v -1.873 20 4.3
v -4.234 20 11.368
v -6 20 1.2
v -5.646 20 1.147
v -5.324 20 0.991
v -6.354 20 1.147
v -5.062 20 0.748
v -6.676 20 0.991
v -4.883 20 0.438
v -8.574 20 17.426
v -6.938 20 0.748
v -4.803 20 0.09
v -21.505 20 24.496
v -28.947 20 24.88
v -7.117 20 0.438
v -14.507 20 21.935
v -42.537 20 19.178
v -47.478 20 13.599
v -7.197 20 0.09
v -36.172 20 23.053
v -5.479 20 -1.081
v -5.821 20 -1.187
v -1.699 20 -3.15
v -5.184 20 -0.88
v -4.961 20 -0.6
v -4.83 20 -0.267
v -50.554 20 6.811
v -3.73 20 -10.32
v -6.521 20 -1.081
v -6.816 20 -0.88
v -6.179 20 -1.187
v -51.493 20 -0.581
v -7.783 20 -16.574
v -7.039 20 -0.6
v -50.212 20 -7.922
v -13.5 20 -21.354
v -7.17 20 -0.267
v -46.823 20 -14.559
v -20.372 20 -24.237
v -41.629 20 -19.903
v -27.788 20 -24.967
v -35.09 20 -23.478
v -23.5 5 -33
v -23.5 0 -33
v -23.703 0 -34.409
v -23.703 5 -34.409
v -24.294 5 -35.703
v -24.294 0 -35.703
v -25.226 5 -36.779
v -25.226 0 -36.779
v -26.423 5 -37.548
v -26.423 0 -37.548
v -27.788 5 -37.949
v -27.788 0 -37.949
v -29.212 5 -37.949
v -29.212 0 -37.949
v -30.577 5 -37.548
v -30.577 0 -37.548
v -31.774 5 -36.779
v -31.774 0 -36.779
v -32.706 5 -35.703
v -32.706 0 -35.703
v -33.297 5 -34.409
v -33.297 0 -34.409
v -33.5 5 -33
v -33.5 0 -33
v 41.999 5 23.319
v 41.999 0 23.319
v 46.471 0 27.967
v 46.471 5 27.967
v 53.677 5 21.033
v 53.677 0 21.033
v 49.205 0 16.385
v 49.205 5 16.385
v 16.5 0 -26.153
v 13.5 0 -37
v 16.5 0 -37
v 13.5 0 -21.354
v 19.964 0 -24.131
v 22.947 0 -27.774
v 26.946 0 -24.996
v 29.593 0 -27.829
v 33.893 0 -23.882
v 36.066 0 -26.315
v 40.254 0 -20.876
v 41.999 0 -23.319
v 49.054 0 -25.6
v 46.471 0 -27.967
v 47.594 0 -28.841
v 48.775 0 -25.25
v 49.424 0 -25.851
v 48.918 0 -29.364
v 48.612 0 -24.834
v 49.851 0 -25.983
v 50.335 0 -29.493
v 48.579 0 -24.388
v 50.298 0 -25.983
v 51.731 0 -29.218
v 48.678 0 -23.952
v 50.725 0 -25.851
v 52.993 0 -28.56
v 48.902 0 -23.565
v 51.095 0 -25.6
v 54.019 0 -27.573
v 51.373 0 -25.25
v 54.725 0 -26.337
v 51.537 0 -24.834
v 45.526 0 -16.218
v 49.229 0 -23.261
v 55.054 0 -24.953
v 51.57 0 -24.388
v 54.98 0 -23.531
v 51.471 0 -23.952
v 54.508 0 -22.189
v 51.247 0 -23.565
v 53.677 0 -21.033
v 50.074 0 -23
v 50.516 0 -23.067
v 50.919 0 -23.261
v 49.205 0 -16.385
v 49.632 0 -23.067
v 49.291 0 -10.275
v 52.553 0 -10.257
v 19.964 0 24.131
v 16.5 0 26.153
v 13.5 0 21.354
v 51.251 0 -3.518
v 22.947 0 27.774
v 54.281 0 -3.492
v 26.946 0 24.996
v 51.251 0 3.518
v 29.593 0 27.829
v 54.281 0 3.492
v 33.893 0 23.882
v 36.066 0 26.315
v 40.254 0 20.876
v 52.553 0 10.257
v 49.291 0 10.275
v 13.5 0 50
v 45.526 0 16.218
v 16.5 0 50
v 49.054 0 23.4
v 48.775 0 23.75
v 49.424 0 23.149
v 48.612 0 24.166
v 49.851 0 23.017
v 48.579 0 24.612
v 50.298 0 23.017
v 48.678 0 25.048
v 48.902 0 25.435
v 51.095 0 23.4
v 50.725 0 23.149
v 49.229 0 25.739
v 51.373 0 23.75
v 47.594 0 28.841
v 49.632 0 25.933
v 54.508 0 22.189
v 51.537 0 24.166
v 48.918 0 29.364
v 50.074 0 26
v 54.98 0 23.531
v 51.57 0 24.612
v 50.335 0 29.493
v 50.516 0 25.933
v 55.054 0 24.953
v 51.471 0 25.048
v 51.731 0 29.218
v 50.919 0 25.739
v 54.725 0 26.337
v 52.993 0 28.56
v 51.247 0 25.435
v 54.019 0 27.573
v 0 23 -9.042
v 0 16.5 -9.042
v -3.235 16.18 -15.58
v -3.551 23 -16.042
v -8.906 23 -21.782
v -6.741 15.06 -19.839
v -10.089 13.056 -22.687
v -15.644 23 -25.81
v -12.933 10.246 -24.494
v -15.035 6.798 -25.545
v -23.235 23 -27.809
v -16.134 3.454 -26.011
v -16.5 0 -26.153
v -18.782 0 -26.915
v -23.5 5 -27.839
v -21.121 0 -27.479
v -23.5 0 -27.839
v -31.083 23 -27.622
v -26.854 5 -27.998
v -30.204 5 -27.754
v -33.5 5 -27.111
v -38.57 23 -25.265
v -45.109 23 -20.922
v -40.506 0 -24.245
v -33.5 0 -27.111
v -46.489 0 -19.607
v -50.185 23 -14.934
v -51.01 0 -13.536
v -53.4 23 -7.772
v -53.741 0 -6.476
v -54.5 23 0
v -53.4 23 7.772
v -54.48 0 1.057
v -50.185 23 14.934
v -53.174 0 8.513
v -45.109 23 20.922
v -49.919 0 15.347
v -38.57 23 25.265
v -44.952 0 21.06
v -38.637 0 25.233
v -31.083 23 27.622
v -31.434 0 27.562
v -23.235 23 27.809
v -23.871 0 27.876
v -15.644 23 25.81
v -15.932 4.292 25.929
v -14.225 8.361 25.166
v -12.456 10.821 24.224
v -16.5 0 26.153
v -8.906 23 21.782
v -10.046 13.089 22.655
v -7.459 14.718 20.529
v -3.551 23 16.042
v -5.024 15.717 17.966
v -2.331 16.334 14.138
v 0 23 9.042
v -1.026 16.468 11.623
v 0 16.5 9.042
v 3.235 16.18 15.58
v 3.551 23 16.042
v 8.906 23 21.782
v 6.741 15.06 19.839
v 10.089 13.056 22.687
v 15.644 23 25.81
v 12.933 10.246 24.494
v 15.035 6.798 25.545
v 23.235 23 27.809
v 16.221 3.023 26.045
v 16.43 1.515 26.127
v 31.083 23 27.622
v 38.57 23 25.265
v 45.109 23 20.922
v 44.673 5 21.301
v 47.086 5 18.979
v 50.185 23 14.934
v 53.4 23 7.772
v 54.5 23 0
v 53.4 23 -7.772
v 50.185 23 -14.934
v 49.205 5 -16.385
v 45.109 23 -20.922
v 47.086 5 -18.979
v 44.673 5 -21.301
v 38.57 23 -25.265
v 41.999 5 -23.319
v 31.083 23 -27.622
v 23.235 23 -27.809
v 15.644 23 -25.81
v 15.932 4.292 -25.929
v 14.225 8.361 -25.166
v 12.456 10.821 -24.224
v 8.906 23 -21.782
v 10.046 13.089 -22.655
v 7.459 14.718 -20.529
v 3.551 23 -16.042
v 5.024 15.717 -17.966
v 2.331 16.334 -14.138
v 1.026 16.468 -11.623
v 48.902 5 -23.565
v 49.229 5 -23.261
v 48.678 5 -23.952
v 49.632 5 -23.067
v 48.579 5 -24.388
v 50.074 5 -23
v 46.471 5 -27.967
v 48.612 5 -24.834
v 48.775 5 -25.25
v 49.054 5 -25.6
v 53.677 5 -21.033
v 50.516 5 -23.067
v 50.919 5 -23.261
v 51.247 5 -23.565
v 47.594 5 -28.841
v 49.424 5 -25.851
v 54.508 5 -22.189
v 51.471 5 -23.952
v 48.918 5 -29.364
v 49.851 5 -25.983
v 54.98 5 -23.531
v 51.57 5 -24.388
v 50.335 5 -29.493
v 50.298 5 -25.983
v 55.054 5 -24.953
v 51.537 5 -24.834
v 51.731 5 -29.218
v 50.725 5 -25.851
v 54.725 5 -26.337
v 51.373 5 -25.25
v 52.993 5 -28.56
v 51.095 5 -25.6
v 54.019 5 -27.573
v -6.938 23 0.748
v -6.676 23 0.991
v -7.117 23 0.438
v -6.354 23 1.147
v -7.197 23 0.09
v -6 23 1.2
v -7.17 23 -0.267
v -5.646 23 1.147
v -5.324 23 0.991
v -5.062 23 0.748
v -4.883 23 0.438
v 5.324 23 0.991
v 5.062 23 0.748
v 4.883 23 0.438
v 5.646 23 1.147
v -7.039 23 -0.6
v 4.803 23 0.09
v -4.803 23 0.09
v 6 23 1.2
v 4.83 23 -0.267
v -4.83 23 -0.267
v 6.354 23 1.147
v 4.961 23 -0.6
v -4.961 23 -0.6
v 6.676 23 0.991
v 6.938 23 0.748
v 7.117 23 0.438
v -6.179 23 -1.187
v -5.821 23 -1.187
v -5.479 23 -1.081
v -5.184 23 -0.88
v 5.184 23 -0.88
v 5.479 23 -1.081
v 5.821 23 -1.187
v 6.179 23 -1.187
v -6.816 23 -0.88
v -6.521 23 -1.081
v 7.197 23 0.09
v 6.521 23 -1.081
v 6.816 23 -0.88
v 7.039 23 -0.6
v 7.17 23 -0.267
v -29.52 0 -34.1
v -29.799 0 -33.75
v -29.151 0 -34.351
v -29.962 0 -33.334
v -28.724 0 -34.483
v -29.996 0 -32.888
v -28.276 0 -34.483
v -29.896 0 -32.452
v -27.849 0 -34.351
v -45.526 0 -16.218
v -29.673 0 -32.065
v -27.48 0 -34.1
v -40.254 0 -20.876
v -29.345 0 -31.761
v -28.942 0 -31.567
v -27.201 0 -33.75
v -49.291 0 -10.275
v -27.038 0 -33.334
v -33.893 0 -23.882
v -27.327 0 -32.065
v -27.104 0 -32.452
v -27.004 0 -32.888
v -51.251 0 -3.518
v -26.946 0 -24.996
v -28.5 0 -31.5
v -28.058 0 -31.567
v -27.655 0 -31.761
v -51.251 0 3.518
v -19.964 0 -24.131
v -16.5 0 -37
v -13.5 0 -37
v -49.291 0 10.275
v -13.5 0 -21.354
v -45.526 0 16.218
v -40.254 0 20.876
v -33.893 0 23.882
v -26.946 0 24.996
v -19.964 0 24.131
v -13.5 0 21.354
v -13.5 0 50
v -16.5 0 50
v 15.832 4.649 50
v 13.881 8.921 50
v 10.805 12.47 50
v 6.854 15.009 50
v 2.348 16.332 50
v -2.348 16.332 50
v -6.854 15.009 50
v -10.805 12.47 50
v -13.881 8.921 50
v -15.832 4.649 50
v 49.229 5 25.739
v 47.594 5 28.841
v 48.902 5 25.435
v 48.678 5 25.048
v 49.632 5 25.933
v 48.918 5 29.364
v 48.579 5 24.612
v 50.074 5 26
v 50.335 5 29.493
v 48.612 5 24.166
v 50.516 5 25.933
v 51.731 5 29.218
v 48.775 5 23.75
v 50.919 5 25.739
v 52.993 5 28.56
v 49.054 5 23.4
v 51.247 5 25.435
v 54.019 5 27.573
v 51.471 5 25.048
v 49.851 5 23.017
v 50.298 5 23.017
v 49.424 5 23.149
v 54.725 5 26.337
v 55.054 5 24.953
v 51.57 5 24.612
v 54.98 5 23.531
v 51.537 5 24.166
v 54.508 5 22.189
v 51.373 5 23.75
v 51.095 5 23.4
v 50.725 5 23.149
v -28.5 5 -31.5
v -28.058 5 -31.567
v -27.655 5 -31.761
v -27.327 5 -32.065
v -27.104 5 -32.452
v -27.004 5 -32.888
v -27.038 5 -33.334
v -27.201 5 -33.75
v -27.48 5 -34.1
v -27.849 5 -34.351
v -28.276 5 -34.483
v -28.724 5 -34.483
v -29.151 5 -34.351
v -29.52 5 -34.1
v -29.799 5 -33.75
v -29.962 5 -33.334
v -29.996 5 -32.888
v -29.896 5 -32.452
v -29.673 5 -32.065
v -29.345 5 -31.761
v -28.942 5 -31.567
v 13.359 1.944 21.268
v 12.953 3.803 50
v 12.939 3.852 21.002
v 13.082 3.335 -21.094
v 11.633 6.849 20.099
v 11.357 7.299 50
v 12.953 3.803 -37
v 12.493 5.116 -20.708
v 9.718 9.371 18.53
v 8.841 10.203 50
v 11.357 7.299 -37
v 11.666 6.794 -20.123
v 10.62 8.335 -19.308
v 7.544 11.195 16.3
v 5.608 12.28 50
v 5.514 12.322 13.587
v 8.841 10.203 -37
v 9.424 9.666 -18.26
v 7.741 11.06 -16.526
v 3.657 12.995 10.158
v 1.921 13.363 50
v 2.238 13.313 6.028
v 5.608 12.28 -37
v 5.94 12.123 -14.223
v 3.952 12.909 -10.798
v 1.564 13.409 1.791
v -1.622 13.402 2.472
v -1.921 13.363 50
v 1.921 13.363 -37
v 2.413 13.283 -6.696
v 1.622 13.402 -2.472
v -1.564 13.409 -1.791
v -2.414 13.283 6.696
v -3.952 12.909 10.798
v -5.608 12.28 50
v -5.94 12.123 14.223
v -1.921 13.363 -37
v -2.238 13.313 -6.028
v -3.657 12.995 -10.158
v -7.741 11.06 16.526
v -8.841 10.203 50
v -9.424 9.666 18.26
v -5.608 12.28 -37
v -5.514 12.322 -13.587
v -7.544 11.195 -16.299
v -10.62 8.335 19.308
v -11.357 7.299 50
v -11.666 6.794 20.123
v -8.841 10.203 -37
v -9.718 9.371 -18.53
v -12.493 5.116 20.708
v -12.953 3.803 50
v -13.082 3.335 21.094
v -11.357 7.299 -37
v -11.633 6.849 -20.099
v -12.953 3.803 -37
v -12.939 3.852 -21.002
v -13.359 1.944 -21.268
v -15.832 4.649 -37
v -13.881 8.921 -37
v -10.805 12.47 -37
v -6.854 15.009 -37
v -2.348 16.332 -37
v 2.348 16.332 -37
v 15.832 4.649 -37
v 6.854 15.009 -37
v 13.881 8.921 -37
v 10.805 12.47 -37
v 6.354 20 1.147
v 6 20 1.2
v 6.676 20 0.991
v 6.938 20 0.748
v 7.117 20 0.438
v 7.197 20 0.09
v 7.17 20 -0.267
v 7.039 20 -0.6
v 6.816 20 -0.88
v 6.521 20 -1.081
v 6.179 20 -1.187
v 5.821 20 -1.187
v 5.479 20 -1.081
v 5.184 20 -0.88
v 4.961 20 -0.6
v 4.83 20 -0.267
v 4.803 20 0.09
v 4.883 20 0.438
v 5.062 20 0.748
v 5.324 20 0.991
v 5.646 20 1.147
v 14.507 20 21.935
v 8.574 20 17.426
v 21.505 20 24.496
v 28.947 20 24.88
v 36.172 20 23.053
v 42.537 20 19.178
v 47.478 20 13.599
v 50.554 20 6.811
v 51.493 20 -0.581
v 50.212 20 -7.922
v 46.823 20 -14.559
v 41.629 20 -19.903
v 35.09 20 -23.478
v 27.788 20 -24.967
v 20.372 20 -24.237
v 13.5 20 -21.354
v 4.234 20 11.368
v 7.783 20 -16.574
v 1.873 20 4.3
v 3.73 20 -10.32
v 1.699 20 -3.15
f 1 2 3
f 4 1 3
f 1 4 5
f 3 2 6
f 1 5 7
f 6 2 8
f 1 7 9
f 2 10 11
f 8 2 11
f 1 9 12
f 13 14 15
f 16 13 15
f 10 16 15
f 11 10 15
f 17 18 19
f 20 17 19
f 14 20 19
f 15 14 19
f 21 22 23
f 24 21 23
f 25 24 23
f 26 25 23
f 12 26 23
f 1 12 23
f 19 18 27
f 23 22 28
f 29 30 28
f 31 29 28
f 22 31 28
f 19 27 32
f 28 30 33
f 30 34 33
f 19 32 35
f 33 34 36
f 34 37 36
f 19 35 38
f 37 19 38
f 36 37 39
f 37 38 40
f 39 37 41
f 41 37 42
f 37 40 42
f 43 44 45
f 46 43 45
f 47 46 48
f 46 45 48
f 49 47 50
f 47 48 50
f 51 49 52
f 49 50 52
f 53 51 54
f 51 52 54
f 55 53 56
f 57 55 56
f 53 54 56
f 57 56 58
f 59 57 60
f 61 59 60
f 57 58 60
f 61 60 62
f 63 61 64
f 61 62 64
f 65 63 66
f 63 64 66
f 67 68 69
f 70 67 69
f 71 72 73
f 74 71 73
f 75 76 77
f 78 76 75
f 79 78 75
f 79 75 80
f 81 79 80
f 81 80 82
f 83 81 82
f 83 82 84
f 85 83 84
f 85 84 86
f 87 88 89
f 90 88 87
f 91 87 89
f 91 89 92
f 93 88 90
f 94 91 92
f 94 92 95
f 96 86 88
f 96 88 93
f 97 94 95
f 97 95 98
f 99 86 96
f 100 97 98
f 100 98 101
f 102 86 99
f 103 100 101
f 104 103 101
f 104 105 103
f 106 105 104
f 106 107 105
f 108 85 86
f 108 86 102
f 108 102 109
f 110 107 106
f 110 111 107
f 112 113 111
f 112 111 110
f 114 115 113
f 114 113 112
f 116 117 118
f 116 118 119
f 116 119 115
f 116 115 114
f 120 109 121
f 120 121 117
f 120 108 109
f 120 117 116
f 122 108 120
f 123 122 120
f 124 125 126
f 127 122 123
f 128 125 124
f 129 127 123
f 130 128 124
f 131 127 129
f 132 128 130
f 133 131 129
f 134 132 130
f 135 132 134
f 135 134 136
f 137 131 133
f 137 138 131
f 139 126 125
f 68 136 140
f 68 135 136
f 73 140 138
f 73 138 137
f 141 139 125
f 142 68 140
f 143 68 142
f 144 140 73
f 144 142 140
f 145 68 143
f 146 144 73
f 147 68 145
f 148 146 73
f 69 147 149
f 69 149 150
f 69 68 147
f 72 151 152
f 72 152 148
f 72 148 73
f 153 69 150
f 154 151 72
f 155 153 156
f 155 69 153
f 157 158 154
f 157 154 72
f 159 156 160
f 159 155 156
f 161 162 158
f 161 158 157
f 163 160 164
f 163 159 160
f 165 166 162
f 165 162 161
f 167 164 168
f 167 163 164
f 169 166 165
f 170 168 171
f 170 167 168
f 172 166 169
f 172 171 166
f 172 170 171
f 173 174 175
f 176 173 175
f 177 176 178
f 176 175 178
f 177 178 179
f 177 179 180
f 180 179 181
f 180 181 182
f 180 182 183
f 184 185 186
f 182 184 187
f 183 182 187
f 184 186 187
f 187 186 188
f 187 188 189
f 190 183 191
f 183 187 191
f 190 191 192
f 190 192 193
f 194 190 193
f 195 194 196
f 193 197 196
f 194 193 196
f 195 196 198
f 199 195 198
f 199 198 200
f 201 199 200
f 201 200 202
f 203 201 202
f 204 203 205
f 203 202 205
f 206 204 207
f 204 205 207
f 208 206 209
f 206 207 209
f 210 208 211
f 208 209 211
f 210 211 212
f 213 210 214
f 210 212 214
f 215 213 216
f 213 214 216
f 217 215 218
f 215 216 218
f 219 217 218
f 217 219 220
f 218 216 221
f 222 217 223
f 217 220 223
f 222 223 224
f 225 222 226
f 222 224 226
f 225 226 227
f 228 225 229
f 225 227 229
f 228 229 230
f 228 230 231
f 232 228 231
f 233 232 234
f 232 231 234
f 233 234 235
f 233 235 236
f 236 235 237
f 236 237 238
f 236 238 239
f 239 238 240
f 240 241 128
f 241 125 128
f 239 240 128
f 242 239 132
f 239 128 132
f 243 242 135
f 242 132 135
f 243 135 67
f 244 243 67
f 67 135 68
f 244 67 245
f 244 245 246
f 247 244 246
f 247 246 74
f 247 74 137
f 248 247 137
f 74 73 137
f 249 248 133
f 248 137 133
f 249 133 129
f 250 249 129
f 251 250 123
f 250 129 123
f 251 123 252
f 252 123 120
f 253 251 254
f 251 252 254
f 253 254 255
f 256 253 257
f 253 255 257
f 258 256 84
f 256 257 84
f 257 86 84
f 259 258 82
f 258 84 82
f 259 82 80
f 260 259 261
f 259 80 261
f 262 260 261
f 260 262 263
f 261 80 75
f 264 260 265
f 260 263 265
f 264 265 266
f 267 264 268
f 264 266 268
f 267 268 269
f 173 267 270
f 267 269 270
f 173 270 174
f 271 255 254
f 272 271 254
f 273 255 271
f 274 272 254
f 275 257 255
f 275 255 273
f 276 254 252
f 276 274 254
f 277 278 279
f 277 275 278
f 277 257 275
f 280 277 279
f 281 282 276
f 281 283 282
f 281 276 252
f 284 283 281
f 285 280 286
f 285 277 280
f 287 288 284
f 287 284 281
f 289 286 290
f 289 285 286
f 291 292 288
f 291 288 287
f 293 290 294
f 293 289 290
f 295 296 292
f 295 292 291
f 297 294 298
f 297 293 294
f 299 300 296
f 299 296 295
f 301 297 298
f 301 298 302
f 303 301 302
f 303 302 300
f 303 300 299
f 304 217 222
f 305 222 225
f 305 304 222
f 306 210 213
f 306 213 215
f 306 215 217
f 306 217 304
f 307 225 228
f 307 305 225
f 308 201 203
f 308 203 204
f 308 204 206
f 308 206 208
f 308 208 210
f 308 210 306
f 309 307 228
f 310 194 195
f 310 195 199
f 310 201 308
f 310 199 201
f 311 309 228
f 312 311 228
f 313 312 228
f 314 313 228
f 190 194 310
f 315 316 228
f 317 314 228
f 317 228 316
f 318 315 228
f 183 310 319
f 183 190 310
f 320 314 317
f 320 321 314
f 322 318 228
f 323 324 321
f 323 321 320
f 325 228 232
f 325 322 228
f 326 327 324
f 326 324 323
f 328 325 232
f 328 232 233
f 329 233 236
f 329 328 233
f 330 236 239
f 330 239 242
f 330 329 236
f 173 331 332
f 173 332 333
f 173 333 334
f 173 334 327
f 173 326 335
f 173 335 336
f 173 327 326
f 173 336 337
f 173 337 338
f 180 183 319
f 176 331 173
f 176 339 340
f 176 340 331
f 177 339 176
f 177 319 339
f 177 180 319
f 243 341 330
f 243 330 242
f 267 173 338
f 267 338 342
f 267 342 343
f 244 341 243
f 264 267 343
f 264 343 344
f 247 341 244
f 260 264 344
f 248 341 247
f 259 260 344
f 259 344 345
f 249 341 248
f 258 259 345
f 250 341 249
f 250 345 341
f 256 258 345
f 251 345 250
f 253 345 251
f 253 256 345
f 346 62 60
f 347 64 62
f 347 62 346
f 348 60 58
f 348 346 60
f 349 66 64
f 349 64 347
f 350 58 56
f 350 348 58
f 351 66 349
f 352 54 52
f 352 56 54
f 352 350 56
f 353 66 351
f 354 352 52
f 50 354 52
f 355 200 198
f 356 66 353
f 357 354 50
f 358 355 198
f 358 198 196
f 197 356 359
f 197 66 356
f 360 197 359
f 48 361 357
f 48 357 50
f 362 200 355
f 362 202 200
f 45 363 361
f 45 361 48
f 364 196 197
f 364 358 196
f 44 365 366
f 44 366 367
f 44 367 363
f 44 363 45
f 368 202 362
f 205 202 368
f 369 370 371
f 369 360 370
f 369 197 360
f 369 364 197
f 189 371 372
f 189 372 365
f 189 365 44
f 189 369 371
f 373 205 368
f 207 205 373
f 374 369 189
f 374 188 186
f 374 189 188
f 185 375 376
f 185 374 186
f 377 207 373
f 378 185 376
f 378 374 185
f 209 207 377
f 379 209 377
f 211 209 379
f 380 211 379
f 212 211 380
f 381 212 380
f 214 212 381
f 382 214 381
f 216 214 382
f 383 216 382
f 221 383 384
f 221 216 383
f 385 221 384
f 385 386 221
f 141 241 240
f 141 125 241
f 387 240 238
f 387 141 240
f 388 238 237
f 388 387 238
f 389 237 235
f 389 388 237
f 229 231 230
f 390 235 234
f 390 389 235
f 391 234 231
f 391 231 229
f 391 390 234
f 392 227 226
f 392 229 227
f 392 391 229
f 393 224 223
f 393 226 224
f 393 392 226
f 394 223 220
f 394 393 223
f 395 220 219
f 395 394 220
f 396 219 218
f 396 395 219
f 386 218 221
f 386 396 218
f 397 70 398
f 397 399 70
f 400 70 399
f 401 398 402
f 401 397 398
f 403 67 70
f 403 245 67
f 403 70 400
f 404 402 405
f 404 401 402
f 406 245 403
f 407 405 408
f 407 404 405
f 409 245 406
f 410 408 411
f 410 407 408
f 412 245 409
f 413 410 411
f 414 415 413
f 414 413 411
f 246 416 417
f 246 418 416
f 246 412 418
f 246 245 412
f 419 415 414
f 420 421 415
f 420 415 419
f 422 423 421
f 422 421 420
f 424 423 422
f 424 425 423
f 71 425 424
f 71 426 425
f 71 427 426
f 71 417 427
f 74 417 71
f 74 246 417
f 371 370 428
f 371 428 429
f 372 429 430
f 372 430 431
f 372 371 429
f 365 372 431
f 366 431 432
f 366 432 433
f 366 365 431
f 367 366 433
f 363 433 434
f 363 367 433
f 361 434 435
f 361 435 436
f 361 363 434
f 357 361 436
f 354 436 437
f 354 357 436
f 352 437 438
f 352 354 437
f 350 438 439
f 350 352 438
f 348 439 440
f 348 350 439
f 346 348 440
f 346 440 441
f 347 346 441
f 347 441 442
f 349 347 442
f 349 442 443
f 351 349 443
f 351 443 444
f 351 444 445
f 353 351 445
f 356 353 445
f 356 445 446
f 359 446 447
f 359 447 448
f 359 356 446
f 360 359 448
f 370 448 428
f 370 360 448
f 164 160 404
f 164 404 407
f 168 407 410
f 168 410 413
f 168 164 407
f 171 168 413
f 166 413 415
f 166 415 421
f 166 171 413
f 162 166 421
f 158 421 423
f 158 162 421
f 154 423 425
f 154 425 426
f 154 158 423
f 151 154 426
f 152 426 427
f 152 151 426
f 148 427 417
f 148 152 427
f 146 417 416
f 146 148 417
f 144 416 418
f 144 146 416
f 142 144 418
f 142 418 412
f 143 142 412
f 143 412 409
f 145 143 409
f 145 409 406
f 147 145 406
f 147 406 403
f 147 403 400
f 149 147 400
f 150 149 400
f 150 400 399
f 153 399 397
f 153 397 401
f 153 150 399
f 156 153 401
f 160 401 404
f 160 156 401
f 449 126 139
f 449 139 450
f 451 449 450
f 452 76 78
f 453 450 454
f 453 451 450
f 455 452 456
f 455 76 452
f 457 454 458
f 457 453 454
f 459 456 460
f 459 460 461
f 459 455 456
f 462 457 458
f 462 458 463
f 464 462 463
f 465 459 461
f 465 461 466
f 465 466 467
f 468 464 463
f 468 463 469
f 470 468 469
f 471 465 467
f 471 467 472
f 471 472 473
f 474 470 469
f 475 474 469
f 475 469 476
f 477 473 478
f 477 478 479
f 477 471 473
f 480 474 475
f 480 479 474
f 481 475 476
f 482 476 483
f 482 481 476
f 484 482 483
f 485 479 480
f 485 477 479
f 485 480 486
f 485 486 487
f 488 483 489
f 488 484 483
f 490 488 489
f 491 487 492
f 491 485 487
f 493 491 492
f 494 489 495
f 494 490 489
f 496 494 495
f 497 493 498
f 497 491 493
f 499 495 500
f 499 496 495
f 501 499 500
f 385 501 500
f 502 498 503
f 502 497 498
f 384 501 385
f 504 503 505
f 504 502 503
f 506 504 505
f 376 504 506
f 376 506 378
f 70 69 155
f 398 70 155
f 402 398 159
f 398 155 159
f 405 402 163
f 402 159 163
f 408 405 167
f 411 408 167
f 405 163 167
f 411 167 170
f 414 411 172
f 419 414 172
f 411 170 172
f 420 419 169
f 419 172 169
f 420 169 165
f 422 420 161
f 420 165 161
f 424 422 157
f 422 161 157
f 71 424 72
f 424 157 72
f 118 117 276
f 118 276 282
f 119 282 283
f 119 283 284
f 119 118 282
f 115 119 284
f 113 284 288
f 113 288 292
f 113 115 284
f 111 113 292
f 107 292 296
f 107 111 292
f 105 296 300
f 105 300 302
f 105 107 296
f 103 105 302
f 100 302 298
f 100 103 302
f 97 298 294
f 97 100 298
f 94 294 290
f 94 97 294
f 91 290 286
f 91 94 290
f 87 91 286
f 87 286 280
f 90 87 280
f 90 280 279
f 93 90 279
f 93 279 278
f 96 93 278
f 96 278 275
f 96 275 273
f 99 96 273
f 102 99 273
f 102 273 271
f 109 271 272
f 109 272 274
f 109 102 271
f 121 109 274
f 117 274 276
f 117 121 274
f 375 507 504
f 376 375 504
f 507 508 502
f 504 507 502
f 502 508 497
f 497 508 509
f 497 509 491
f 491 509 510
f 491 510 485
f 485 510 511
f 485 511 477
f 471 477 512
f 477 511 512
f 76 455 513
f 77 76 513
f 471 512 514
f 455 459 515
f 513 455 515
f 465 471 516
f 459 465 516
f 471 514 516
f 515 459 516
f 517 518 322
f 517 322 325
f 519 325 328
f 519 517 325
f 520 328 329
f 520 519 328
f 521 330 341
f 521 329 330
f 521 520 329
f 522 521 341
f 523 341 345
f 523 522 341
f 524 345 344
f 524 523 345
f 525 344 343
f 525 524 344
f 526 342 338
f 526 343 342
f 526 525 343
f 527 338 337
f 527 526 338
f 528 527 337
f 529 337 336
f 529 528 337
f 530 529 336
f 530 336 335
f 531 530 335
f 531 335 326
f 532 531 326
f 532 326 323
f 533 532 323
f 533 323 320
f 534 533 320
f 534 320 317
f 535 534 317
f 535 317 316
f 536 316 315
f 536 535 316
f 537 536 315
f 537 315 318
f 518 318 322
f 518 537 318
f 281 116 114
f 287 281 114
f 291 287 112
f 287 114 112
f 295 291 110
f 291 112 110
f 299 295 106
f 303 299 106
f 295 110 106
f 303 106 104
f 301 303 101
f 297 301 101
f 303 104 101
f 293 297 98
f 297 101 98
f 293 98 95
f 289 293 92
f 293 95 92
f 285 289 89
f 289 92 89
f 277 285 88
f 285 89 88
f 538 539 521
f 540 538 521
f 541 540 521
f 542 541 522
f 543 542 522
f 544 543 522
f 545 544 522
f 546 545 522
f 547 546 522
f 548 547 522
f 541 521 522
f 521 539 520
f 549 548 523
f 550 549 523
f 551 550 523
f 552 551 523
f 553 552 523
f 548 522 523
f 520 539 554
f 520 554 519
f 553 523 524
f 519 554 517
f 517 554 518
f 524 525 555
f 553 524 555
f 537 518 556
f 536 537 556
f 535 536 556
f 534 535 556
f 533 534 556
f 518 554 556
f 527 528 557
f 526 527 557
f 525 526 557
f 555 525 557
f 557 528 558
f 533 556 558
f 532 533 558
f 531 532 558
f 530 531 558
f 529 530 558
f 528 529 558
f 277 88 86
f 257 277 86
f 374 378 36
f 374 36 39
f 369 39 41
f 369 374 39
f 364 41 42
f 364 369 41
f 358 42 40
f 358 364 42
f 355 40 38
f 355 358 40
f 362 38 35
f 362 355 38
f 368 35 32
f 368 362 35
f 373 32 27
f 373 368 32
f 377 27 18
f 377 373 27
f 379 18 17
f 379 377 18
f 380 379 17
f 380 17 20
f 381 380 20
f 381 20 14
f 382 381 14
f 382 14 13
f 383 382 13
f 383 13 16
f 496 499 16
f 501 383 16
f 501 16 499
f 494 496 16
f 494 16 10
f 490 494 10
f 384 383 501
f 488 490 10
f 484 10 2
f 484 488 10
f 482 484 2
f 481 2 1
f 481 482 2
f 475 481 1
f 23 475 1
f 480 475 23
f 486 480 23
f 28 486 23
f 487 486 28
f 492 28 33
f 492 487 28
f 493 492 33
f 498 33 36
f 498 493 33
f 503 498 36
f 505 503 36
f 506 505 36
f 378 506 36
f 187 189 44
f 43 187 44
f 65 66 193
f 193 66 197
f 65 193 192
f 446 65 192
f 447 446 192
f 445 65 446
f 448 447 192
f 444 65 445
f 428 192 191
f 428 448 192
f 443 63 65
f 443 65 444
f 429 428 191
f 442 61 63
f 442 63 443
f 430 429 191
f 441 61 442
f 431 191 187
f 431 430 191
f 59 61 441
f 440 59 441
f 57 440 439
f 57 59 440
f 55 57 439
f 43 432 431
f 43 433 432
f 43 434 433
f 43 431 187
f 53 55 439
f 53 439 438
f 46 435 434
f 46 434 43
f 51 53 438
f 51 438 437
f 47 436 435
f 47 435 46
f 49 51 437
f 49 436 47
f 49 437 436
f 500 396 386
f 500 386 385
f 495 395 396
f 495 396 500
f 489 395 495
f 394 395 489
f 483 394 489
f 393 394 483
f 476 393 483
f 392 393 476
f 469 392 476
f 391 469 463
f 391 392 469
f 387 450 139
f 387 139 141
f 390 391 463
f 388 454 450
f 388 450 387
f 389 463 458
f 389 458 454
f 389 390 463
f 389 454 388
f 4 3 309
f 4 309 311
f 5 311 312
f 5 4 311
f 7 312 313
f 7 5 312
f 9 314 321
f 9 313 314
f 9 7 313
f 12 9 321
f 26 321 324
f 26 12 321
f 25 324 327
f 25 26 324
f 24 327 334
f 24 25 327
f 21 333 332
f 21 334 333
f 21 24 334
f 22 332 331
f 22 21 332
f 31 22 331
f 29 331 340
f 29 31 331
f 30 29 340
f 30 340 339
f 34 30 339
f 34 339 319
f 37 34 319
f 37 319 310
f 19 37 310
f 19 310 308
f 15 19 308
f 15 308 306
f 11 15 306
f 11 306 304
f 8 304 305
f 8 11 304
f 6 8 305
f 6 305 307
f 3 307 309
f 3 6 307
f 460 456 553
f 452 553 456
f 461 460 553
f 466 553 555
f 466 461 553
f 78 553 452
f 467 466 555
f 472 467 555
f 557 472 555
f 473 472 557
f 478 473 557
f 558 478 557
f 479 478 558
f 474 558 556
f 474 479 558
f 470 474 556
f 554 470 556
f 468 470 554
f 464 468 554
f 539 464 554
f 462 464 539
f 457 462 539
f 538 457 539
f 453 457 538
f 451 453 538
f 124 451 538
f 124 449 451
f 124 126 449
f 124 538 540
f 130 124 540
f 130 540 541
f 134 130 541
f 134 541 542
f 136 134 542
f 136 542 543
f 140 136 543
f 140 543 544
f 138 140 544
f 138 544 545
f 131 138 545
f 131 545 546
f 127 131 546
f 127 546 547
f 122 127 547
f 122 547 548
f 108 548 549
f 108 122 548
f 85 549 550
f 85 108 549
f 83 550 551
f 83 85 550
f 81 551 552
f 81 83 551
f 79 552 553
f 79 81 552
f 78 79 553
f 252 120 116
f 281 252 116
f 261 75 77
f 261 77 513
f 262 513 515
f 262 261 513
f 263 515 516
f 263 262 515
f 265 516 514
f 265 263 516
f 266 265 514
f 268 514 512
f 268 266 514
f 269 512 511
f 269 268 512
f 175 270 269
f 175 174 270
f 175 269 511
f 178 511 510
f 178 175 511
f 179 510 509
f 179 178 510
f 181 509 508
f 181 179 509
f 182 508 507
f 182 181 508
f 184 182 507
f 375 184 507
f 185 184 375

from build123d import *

# Parameters (mm, degrees)
BOSS_EXTRUDE1_DEPTH     = 23
SKETCH2_R               = 1.5
BOSS_EXTRUDE2_DEPTH     = 5
SKETCH3_R               = 1.5
BOSS_EXTRUDE3_DEPTH     = 5
BOSS_EXTRUDE4_DEPTH     = 37
BOSS_EXTRUDE5_START     = 50
BOSS_EXTRUDE5_DEPTH     = 50
CUT_EXTRUDE1_DEPTH      = 78.86002886
CUT_EXTRUDE1_DEPTH_BACK = 78.86002886
SKETCH5_R               = 25
CUT_EXTRUDE4_DEPTH      = 20
SKETCH7_R               = 1.2
CUT_EXTRUDE6_DEPTH      = 78.86002886


with BuildPart() as part:
    # Sketch1 → Boss-Extrude1 (new body)
    with BuildSketch(Plane(origin=(0, 0, 0), x_dir=(1, 0, 0), z_dir=(0, 1, 0))):
        with BuildLine():
            ThreePointArc((0, 9.04157066), (-54.5, 0), (0, -9.04157066))
            ThreePointArc((0, -9.04157066), (54.5, 0), (0, 9.04157066))
        make_face()
    extrude(amount=BOSS_EXTRUDE1_DEPTH)

    # Sketch2 → Boss-Extrude2 (add)
    with BuildSketch(Plane(origin=(0, 0, 0), x_dir=(1, 0, 0), z_dir=(0, 1, 0))):
        with BuildLine():
            Line((-33.5, 33), (-33.5, 27.110883423))
            ThreePointArc((-33.5, 27.110883423), (-28.532848636, 27.926108329), (-23.5, 27.838821814))
            Line((-23.5, 27.838821814), (-23.5, 33))
            ThreePointArc((-23.5, 33), (-28.5, 38), (-33.5, 33))
        make_face()
        with Locations((-28.5, 33)):
            Circle(SKETCH2_R, mode=Mode.SUBTRACT)
    extrude(amount=BOSS_EXTRUDE2_DEPTH)

    # Sketch3 → Boss-Extrude3 (add)
    # profile 1 of 2: a face of its own
    with BuildSketch(Plane(origin=(0, 0, 0), x_dir=(1, 0, 0), z_dir=(0, 1, 0))):
        with BuildLine():
            Line((41.999184876, -23.318989433), (46.471409292, -27.966816245))
            ThreePointArc((46.471409292, -27.966816245), (53.541166714, -28.102941176), (53.677291645, -21.033183755))
            Line((53.677291645, -21.033183755), (49.205067229, -16.385356942))
            ThreePointArc((49.205067229, -16.385356942), (45.914170974, -20.176470588), (41.999184876, -23.318989433))
        make_face()
        with Locations((50.074350468, -24.5)):
            Circle(SKETCH3_R, mode=Mode.SUBTRACT)
    # profile 2 of 2: a face of its own
    with BuildSketch(Plane(origin=(0, 0, 0), x_dir=(1, 0, 0), z_dir=(0, 1, 0))):
        with BuildLine():
            ThreePointArc((53.677291645, 21.033183755), (53.541166714, 28.102941176), (46.471409292, 27.966816245))
            Line((46.471409292, 27.966816245), (41.999184876, 23.318989433))
            ThreePointArc((41.999184876, 23.318989433), (45.914170974, 20.176470588), (49.205067229, 16.385356942))
            Line((49.205067229, 16.385356942), (53.677291645, 21.033183755))
        make_face()
        with Locations((50.074350468, 24.5)):
            Circle(SKETCH3_R, mode=Mode.SUBTRACT)
    extrude(amount=BOSS_EXTRUDE3_DEPTH)

    # Sketch6 → Boss-Extrude4 (add)
    with BuildSketch(Plane.XY):
        with BuildLine():
            Line((-16.5, 0), (16.5, 0))
            ThreePointArc((16.5, 0), (0, 16.5), (-16.5, 0))
        make_face()
    extrude(amount=-BOSS_EXTRUDE4_DEPTH)

    # Sketch6<2> → Boss-Extrude5 (add)
    with BuildSketch(Plane.XY.offset(BOSS_EXTRUDE5_START)):
        with BuildLine():
            Line((-16.5, 0), (16.5, 0))
            ThreePointArc((16.5, 0), (0, 16.5), (-16.5, 0))
        make_face()
    extrude(amount=-BOSS_EXTRUDE5_DEPTH)

    # Sketch4 → Cut-Extrude1 (cut, two sides: drawn at the far end of the back side and taken through both)
    with BuildSketch(Plane.XY.offset(-CUT_EXTRUDE1_DEPTH_BACK)):
        with BuildLine():
            Line((-13.5, 0), (13.5, 0))
            ThreePointArc((13.5, 0), (0, 13.5), (-13.5, 0))
        make_face()
    extrude(amount=CUT_EXTRUDE1_DEPTH + CUT_EXTRUDE1_DEPTH_BACK, mode=Mode.SUBTRACT)

    # Sketch5 → Cut-Extrude4 (cut)
    with BuildSketch(Plane(origin=(0, 0, 0), x_dir=(1, 0, 0), z_dir=(0, 1, 0))):
        with Locations((-26.5, 0)):
            Circle(SKETCH5_R)
        with Locations((26.5, 0)):
            Circle(SKETCH5_R)
    extrude(amount=CUT_EXTRUDE4_DEPTH, mode=Mode.SUBTRACT)

    # Sketch7 → Cut-Extrude6 (cut, through all)
    with BuildSketch(Plane(origin=(0, 0, 0), x_dir=(1, 0, 0), z_dir=(0, 1, 0))):
        with Locations((-6, 0)):
            Circle(SKETCH7_R)
        with Locations((6, 0)):
            Circle(SKETCH7_R)
    extrude(amount=CUT_EXTRUDE6_DEPTH, mode=Mode.SUBTRACT)


solid = part.part
